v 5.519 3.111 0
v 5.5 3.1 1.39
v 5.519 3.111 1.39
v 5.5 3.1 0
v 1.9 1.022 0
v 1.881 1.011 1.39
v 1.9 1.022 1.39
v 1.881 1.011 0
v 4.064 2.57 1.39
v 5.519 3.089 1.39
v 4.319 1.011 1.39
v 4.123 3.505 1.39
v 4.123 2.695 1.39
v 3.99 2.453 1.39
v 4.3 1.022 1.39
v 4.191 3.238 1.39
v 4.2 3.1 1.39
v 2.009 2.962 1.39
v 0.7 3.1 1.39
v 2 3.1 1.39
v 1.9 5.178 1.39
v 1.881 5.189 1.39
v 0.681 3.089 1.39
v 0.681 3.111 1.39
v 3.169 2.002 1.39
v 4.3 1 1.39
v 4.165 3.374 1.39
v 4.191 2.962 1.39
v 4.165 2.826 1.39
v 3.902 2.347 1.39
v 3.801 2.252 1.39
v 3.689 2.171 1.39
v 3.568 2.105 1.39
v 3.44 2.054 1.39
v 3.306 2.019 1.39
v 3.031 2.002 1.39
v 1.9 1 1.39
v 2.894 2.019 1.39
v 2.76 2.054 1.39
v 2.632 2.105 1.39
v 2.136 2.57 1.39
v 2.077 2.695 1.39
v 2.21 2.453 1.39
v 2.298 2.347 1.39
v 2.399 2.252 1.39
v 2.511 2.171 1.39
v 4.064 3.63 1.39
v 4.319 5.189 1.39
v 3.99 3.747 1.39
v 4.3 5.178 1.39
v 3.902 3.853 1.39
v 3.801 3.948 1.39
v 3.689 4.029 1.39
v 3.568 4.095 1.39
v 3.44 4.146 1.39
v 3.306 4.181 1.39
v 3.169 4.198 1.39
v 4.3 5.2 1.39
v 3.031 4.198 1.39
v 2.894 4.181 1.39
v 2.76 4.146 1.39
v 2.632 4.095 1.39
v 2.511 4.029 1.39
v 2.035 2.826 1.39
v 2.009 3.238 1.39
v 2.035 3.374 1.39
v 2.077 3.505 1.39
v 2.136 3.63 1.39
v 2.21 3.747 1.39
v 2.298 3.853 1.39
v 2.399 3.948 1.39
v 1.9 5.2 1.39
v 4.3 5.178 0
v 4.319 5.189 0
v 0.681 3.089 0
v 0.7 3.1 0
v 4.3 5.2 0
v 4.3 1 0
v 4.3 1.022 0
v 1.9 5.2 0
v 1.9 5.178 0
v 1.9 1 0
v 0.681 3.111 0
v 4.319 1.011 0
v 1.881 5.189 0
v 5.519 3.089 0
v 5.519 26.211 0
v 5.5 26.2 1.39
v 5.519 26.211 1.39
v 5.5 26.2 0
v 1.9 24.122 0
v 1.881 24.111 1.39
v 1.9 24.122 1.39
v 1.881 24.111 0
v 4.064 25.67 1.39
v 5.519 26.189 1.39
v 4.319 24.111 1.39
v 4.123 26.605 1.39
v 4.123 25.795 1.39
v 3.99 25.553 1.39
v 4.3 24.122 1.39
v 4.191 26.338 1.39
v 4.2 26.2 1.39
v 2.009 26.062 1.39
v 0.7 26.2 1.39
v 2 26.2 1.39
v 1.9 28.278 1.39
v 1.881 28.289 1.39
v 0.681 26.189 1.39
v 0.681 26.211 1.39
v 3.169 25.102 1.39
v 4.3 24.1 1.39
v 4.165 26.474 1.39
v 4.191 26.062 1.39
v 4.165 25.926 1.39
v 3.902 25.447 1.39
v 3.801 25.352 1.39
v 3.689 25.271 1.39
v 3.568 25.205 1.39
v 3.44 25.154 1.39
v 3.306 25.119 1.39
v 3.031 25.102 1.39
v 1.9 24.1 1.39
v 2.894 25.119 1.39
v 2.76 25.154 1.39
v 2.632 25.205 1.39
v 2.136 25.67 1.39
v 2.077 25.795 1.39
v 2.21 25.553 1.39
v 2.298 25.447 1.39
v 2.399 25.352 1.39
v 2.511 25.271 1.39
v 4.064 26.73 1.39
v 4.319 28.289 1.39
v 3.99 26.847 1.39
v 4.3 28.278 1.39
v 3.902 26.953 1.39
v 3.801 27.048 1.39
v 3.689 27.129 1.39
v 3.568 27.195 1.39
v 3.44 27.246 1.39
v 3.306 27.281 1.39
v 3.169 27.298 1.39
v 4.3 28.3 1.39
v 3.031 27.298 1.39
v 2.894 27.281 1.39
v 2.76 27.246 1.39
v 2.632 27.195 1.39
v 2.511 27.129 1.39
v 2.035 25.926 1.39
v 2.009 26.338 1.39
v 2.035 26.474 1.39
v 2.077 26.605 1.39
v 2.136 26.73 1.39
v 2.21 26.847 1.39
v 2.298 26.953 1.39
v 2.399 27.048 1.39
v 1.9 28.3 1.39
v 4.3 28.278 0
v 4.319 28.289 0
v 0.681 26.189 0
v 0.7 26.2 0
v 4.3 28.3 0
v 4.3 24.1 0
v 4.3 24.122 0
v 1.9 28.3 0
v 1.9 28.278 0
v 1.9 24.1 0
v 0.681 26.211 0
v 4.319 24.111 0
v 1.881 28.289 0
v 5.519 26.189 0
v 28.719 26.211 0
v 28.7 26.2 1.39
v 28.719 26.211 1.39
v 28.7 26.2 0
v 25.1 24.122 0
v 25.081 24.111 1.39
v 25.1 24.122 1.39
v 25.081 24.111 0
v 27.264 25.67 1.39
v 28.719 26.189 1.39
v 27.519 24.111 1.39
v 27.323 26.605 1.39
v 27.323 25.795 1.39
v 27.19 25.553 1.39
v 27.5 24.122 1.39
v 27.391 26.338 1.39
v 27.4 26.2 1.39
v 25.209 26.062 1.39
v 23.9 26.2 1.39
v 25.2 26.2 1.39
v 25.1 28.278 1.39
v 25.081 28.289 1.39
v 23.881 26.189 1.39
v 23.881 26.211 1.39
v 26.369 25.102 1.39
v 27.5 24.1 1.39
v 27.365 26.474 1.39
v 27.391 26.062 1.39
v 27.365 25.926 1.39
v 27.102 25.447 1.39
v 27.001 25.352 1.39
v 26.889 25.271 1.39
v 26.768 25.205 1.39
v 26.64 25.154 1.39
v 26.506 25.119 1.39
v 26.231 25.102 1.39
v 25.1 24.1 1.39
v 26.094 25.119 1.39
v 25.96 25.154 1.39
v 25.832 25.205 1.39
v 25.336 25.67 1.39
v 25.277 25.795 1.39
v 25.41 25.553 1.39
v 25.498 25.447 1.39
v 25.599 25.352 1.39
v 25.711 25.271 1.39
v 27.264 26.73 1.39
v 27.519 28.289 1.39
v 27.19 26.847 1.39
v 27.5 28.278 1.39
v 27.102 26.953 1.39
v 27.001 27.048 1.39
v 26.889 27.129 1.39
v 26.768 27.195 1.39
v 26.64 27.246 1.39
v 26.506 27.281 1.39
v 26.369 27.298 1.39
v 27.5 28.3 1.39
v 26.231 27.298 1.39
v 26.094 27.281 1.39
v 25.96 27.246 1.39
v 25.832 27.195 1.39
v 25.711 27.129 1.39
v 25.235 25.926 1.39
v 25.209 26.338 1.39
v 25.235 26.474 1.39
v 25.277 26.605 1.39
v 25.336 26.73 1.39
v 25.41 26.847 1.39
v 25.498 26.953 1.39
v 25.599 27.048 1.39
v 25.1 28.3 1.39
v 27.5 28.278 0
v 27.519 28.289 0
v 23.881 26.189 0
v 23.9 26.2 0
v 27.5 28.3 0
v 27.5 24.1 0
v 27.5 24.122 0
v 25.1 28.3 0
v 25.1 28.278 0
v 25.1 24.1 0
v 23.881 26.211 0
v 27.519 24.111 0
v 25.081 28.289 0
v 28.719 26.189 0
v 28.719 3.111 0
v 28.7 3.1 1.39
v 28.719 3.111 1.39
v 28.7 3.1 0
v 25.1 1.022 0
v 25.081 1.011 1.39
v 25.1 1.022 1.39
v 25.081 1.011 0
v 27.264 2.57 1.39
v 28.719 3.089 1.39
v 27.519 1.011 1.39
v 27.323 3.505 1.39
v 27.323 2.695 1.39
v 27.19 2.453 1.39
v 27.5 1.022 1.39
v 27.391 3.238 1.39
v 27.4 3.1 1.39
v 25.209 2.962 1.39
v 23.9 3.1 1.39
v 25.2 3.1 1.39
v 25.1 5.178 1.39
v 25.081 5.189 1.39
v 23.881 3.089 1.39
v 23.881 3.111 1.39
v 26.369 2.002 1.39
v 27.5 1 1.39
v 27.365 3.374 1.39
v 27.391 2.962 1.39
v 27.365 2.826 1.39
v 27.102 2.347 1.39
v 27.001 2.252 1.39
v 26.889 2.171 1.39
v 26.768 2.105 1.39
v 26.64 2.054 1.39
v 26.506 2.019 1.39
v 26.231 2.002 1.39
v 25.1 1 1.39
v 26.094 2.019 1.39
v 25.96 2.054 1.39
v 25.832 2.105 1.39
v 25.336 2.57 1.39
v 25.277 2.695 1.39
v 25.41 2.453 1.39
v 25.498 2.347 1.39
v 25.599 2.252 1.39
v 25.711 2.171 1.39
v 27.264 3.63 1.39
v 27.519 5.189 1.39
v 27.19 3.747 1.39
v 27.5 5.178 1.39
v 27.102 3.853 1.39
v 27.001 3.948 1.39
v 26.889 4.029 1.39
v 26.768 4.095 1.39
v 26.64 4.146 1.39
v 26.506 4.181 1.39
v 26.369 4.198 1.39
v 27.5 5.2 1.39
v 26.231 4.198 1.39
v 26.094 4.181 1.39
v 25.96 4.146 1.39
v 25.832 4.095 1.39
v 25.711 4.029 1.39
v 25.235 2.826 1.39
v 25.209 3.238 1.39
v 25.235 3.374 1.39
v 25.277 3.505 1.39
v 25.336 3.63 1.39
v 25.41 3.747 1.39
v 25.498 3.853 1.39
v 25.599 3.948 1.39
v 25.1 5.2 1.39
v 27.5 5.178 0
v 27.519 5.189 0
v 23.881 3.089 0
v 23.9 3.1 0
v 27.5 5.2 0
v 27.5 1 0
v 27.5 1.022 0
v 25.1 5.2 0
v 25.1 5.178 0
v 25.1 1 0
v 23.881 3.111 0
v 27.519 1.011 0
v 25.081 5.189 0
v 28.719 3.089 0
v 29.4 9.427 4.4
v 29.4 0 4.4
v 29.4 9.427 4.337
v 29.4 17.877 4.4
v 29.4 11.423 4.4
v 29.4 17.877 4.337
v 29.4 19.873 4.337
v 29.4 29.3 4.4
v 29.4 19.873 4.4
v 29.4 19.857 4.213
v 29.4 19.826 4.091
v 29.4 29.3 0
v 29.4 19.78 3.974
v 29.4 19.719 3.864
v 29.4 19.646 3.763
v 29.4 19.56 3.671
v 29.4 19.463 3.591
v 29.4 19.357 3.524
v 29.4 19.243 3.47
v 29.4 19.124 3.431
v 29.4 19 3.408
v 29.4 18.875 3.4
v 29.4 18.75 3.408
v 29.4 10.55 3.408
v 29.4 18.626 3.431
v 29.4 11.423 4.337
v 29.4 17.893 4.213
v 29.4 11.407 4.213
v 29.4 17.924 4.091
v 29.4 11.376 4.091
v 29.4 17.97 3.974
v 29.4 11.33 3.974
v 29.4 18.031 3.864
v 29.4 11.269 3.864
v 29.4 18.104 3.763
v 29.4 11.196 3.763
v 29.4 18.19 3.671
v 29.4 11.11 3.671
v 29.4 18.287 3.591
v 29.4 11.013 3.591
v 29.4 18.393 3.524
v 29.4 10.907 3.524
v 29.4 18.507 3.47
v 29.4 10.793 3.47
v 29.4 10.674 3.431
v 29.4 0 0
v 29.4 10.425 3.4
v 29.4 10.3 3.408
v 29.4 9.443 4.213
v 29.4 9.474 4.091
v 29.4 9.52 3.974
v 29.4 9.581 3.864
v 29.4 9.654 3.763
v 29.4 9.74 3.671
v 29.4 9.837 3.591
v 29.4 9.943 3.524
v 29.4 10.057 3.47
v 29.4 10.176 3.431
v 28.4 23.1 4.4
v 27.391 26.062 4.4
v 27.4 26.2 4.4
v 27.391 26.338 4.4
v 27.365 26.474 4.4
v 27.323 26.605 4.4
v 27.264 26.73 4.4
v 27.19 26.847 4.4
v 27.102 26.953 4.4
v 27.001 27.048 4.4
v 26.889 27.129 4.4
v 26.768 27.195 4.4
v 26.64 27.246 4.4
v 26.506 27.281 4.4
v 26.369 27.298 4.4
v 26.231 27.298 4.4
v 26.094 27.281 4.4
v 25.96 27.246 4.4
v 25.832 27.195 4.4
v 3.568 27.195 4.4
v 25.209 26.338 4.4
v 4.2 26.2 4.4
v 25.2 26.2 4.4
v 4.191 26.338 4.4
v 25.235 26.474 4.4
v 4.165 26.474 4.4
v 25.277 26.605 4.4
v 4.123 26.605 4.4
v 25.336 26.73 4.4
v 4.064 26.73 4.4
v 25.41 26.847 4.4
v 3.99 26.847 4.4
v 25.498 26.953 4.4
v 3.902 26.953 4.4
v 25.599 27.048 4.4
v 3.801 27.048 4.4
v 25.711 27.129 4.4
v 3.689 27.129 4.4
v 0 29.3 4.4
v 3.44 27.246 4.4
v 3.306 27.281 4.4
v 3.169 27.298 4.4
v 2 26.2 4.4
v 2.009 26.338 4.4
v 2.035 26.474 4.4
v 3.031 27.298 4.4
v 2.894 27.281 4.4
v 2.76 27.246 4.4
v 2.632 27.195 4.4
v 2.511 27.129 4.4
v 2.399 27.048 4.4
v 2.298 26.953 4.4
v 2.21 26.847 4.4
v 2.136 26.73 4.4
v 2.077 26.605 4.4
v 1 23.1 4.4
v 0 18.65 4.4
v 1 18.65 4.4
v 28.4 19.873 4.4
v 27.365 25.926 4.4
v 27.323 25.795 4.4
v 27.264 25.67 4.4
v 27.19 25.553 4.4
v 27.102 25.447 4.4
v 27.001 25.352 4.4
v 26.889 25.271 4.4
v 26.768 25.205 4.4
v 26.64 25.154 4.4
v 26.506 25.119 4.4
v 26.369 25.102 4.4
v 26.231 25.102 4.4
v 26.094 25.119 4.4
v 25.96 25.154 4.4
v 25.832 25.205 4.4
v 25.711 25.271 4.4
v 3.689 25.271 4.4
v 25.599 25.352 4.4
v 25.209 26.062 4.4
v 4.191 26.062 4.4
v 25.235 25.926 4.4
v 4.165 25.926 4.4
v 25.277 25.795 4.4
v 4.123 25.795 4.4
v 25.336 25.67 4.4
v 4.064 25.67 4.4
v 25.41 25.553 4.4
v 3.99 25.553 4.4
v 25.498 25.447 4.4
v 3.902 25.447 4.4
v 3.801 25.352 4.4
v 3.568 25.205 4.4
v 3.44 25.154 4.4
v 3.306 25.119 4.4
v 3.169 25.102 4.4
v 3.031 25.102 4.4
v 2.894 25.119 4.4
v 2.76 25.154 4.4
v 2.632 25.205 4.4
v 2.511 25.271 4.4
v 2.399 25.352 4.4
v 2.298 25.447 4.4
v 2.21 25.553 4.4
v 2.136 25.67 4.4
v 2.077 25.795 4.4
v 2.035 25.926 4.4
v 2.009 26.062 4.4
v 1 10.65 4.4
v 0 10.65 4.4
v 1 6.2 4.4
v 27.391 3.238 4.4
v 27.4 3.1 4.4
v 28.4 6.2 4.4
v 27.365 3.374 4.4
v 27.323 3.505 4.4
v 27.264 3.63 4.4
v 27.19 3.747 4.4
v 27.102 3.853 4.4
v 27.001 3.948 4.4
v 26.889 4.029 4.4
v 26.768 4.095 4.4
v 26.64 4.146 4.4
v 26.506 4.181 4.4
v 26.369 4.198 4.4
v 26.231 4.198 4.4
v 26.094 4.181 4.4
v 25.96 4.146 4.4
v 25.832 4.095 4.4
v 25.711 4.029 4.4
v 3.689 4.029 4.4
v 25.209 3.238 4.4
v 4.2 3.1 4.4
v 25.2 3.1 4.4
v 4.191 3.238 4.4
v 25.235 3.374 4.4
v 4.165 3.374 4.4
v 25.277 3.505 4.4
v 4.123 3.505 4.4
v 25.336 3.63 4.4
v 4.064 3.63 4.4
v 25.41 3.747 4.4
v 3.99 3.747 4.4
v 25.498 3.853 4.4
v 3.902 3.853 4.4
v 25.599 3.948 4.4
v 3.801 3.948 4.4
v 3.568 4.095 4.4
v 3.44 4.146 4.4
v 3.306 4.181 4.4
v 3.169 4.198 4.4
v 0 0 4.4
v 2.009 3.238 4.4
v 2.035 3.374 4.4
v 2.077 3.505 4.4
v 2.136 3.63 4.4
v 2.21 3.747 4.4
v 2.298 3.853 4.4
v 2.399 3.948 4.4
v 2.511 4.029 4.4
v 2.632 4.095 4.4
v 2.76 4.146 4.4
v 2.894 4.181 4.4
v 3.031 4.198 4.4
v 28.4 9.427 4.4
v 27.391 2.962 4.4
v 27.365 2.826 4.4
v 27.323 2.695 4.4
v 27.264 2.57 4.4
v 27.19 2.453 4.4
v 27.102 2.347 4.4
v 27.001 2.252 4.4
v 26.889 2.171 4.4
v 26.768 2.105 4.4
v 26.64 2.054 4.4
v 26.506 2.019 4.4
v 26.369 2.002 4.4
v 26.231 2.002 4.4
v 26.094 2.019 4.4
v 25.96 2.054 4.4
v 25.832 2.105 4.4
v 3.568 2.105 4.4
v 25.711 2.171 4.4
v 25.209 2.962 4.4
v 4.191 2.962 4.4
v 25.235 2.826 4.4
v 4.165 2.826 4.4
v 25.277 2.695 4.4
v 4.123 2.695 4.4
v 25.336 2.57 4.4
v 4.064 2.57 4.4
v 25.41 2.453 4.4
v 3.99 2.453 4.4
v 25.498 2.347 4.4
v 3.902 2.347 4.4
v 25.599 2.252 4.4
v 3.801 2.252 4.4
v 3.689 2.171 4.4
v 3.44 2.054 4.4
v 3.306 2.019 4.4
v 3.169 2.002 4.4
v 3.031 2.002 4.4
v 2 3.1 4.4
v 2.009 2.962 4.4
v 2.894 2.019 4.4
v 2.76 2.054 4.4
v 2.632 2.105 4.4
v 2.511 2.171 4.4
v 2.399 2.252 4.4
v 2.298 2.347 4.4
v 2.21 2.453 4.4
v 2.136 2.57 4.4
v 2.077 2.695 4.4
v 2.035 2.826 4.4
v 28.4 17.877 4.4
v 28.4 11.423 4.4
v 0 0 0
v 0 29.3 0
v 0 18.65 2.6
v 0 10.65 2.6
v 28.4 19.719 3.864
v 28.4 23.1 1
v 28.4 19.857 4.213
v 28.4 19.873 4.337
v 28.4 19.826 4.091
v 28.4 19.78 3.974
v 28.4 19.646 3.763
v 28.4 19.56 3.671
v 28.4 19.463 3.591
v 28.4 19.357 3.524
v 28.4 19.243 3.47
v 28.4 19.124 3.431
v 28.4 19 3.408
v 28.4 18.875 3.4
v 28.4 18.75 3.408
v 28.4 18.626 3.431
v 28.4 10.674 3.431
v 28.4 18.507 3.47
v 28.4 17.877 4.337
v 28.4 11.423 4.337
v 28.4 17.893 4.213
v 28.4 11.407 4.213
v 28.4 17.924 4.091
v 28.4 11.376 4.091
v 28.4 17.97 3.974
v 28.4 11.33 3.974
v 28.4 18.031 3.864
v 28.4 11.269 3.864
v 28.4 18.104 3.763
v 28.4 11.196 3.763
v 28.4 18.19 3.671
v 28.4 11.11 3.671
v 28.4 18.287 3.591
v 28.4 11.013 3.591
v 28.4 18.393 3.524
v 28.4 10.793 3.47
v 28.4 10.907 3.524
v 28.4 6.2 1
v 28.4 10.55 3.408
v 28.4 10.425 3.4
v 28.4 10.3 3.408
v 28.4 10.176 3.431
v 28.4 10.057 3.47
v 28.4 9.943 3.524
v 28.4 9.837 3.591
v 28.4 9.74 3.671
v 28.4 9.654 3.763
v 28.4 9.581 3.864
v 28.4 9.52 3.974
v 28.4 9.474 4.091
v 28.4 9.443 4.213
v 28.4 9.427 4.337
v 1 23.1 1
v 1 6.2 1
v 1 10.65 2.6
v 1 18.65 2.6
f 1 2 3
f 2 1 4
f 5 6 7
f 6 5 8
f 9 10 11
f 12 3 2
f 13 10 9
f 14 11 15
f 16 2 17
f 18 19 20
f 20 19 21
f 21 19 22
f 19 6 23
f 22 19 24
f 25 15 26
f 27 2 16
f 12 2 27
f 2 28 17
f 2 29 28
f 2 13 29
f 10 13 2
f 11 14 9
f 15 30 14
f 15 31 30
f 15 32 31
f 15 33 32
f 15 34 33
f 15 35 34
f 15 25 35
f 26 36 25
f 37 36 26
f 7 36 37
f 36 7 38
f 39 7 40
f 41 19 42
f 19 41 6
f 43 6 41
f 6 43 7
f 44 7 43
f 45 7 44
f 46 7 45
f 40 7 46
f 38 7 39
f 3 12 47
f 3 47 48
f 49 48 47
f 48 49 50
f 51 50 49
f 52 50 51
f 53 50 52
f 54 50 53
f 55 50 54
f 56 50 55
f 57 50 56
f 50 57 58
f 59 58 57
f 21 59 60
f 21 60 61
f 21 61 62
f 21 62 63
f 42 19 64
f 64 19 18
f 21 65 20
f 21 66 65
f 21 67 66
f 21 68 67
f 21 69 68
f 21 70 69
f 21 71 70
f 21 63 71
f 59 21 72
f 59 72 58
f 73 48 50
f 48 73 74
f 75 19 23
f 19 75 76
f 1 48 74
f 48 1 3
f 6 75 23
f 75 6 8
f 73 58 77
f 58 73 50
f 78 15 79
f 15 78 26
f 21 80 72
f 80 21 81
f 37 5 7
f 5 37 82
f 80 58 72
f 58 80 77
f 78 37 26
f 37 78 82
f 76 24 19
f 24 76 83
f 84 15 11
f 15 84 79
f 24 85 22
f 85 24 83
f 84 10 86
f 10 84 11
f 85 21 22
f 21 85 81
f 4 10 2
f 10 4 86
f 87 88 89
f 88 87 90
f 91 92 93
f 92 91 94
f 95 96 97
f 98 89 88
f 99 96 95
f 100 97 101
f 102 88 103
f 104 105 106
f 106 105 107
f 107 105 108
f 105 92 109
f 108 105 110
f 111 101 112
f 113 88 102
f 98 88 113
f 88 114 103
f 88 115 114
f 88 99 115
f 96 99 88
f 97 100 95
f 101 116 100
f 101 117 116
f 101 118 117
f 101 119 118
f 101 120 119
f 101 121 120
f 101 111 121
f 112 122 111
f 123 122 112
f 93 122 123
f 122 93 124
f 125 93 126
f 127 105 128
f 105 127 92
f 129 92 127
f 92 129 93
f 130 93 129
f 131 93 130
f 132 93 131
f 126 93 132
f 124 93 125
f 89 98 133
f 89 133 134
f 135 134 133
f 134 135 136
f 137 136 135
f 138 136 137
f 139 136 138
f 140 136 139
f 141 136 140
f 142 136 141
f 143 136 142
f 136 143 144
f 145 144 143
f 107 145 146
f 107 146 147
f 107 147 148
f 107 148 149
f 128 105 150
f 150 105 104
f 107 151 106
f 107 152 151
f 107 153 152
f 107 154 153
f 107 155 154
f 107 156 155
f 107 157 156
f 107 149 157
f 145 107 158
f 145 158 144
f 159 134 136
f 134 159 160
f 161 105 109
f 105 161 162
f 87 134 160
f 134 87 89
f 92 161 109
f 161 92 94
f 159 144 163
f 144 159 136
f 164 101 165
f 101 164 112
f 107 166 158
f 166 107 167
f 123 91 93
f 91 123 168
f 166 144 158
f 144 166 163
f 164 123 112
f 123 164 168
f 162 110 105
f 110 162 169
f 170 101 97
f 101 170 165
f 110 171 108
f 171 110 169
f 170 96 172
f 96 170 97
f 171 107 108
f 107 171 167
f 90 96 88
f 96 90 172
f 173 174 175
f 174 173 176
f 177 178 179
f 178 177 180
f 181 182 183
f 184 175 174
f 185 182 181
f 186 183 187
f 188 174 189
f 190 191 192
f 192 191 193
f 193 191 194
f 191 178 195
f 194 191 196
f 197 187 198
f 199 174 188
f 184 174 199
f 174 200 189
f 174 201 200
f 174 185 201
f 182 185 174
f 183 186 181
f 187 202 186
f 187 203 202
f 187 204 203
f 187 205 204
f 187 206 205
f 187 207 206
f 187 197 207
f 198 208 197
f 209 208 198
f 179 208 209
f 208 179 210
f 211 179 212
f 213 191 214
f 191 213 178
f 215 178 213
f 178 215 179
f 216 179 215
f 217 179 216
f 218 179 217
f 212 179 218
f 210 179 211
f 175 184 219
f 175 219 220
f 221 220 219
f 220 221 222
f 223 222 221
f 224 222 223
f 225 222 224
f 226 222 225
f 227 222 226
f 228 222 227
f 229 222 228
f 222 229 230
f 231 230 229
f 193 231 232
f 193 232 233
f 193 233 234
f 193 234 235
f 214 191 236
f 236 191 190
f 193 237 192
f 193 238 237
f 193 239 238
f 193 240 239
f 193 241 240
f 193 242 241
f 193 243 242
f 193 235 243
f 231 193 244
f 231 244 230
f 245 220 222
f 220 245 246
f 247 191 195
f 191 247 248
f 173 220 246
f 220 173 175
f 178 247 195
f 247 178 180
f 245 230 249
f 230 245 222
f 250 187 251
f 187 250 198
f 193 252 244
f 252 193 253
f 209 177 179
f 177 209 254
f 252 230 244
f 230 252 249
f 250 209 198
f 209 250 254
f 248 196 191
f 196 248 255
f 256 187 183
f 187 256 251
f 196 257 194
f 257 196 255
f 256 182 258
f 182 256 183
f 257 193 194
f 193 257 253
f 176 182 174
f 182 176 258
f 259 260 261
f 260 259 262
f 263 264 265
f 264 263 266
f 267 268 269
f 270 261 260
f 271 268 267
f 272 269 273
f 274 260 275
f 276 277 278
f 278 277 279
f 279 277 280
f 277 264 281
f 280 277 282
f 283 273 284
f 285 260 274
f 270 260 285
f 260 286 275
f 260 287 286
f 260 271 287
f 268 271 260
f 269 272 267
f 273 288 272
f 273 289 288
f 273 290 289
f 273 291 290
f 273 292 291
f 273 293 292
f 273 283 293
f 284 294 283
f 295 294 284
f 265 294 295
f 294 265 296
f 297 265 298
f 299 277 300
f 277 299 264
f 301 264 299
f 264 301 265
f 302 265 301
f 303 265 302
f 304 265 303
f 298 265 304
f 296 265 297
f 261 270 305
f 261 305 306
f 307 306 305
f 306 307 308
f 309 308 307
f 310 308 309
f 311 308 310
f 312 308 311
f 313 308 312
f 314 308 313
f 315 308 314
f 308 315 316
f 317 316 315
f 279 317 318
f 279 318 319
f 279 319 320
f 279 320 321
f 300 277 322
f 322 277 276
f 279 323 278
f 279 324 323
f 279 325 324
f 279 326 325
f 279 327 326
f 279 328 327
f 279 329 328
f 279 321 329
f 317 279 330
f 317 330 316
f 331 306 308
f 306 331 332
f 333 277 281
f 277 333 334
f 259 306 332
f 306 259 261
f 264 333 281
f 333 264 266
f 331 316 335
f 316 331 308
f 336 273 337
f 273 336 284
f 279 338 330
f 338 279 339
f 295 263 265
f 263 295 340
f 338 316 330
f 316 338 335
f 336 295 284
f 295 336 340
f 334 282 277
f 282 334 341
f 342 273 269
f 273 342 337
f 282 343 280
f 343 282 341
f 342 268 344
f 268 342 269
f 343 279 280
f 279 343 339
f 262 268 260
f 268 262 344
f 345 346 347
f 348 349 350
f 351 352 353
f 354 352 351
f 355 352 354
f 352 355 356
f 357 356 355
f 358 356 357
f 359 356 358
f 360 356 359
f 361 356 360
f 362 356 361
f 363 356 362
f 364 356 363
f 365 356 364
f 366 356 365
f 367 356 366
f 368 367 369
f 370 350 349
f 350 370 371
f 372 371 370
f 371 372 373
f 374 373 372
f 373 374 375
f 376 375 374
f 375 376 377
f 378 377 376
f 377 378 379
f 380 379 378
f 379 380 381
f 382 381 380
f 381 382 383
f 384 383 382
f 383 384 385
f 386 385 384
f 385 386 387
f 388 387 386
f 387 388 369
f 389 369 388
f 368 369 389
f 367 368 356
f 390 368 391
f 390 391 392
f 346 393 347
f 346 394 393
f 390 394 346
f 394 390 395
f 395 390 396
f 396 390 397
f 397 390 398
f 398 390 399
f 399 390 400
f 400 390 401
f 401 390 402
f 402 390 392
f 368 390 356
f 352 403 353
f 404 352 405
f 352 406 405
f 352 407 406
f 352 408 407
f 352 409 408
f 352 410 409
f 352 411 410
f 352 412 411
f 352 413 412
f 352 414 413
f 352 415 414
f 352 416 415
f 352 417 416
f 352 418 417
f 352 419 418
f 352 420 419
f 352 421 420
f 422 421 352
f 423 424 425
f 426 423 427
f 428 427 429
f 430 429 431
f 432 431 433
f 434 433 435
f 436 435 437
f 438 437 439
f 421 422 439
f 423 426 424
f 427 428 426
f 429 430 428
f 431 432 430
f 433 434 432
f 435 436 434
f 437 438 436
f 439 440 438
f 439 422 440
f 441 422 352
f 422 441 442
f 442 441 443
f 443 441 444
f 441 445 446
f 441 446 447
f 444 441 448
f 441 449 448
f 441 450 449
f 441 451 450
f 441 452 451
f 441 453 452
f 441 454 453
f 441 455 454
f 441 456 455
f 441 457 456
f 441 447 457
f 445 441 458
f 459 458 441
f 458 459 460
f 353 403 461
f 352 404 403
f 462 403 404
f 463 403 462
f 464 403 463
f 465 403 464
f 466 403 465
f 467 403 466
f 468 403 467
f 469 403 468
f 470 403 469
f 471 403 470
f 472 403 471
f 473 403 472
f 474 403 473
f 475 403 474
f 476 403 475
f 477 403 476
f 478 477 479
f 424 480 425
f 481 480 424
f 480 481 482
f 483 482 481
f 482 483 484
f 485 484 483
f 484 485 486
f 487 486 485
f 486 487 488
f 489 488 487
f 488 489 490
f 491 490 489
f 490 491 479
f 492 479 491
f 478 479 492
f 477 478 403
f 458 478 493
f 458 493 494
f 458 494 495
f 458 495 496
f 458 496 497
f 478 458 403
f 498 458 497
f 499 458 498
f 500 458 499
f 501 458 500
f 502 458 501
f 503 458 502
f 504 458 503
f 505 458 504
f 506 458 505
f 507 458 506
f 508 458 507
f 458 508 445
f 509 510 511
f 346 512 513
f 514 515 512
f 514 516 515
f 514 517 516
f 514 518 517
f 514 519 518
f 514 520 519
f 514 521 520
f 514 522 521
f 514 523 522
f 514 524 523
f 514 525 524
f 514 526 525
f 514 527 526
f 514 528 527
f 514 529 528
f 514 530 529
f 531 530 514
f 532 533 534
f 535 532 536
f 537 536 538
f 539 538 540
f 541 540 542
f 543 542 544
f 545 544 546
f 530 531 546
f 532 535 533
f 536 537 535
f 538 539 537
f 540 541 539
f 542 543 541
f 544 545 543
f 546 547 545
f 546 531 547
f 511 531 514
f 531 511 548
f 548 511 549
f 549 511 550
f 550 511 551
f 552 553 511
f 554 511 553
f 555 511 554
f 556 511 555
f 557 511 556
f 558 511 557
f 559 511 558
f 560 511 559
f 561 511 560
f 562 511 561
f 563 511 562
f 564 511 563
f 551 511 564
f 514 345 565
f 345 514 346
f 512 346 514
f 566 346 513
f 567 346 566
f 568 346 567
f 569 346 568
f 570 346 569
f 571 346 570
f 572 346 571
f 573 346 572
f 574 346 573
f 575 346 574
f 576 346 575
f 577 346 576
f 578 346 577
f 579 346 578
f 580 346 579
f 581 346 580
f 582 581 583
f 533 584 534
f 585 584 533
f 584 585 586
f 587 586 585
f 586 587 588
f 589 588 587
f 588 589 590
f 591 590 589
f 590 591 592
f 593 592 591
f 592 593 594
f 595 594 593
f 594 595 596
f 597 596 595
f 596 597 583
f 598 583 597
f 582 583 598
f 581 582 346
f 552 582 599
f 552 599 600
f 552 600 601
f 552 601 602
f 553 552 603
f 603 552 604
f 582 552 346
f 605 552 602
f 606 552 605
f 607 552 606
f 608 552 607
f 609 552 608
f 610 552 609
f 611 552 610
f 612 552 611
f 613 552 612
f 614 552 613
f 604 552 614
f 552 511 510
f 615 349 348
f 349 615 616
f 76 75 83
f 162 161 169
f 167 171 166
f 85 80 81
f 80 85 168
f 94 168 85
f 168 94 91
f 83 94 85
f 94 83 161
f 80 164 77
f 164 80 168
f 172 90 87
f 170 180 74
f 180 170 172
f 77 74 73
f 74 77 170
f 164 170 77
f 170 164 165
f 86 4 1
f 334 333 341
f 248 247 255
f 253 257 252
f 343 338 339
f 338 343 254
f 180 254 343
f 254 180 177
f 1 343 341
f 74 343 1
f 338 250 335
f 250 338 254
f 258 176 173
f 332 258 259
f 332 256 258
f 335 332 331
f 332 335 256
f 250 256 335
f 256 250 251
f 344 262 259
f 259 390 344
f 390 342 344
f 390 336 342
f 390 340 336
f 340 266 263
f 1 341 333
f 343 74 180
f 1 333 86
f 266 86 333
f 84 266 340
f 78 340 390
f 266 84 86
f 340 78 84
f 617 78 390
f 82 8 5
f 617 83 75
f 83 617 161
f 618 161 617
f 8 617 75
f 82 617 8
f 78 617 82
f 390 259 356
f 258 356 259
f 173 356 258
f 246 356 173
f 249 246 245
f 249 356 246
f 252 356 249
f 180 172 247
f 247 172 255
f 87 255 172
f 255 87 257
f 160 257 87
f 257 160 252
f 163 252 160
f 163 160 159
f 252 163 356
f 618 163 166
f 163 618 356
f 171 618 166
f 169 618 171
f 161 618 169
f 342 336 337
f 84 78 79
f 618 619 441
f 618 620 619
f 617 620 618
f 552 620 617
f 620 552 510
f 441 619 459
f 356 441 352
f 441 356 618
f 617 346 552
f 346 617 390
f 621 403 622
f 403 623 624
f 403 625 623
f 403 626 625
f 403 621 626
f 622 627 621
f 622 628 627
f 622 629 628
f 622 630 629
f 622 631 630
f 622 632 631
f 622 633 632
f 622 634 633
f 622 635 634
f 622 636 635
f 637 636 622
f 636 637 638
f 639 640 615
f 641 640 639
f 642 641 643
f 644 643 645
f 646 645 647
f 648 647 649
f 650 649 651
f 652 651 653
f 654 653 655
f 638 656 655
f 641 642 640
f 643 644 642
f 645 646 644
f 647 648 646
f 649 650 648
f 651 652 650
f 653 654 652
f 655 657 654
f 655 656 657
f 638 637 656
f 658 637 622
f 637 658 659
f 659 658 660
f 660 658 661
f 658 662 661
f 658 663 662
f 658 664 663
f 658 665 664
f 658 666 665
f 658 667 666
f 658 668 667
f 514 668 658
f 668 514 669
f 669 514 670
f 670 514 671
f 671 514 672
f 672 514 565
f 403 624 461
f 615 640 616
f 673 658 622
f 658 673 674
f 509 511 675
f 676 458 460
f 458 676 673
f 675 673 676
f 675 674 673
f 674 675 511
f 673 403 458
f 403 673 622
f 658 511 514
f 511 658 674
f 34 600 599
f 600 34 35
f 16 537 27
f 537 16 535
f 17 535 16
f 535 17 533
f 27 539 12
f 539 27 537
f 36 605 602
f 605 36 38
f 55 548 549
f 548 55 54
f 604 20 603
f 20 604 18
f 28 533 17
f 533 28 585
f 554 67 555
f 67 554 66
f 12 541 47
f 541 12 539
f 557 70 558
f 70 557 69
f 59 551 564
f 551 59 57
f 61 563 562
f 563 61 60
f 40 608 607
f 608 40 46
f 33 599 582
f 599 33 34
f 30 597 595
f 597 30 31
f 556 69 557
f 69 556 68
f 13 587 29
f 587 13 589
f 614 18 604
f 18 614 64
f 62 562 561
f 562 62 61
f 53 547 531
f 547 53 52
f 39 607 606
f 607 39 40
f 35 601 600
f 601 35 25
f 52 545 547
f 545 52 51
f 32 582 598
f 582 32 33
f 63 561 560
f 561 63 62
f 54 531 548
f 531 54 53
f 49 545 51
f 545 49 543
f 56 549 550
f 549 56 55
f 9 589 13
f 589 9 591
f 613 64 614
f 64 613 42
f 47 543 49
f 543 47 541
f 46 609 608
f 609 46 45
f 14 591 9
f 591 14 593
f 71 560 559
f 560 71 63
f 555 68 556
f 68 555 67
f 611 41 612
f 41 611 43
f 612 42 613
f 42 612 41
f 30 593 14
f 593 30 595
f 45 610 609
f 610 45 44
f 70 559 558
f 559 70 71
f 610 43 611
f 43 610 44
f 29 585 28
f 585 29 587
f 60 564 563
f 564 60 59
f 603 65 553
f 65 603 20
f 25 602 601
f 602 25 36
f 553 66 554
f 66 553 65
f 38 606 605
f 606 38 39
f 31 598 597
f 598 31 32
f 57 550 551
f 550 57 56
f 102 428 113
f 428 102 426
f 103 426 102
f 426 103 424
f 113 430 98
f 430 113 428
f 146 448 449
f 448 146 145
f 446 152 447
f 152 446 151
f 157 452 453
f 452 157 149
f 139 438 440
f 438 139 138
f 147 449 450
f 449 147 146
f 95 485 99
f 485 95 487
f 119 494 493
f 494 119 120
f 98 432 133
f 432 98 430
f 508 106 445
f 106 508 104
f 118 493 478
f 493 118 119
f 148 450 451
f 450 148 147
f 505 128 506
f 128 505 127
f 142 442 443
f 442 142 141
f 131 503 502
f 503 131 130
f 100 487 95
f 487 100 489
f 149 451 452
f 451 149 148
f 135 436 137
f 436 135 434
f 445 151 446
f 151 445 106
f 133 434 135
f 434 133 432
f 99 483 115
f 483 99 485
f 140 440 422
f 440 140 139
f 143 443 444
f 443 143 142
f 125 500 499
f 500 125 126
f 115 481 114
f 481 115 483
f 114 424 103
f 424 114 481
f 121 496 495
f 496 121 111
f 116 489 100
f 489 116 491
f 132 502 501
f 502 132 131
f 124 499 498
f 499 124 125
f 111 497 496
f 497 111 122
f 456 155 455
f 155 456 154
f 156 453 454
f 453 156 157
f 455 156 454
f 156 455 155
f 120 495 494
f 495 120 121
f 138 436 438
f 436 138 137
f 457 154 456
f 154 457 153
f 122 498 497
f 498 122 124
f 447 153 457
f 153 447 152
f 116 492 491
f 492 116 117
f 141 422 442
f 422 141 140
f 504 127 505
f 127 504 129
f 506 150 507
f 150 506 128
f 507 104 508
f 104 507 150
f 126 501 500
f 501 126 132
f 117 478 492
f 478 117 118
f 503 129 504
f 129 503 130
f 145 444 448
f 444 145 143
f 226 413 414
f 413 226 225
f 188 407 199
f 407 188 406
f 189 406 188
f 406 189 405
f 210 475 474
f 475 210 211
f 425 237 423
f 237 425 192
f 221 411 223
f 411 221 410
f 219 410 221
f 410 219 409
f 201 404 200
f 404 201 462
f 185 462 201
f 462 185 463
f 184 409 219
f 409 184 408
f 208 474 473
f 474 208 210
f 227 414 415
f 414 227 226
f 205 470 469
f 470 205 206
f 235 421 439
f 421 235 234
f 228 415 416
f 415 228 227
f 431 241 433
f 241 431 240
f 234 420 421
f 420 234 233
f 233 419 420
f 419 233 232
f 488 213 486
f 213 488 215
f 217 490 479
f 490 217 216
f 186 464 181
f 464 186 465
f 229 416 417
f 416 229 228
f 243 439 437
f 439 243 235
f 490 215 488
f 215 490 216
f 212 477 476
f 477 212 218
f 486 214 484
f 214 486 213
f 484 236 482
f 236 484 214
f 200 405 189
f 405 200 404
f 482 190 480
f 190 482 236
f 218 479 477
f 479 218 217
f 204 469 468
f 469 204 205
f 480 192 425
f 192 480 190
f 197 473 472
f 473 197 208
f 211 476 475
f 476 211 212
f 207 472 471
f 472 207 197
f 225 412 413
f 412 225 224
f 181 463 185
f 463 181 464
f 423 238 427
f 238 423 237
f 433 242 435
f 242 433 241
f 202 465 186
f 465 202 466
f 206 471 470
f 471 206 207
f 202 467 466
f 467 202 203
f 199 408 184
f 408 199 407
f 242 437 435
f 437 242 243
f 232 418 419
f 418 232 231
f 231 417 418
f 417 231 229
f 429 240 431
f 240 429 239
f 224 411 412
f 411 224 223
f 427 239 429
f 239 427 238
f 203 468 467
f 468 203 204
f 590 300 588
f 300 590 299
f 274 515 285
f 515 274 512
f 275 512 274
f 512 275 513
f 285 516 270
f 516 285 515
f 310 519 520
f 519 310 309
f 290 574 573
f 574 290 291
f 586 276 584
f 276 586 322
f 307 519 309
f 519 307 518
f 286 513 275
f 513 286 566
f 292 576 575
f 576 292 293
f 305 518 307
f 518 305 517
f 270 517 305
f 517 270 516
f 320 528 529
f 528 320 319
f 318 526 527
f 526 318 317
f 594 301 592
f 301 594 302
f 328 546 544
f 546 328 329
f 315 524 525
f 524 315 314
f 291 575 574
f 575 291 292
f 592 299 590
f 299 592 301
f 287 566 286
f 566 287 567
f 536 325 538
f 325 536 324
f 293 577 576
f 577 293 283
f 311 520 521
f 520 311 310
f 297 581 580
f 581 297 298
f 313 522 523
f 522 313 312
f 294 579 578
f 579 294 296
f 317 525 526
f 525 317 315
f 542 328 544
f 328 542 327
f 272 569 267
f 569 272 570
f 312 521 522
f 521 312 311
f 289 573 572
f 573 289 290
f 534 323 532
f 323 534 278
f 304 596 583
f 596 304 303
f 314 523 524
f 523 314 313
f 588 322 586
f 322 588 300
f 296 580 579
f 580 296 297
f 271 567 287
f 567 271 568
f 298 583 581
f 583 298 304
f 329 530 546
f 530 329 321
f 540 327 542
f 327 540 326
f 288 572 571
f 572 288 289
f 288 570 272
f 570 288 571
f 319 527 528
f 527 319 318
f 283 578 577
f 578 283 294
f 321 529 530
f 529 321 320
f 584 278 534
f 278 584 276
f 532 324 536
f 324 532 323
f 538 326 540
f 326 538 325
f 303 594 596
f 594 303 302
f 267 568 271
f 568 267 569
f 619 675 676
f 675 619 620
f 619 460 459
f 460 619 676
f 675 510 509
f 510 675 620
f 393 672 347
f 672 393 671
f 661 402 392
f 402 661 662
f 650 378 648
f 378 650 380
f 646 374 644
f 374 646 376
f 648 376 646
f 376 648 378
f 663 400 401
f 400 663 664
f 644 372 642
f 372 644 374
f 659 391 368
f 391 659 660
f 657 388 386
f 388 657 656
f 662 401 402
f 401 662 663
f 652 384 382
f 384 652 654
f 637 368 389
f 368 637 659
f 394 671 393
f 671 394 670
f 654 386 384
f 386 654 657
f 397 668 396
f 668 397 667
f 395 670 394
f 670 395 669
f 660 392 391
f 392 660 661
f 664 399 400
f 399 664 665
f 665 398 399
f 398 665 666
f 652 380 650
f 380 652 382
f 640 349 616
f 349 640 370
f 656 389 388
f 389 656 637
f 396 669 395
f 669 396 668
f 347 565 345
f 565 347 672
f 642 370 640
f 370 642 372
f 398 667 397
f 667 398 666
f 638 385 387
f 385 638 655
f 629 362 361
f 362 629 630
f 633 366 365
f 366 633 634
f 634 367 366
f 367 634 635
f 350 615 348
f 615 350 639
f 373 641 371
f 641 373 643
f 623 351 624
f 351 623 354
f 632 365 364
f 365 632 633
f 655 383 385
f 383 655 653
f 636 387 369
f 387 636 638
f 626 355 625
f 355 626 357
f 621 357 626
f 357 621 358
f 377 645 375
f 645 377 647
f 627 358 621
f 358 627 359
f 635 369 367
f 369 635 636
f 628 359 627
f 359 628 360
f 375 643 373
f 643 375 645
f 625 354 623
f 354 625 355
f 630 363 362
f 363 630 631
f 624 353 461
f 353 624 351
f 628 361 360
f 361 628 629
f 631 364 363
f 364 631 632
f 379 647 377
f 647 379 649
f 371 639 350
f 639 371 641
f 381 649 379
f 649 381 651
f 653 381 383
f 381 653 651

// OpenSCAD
// bolt radius
br = 1.1;

// battery width and depth and heig
chax = 27.4;
chay = 16.9;
chaz = 4;
chazl = 3.15;

// bolt in depth
bi = 1.4;

// thickness
t = 1;

// bolt hat radius
bh = 2.1;

// usb
usby = 8;
usbz = 2.7;

// pcb
pcbz = 1.6;

// led
led1x = 6.5;
led2x = 11.5;
ledy = 1.2;
ledr = 1;

// wire radius
wr = 1;

module hexagon(size, height) {
  boxWidth = size/1.75;
  for (r = [-60, 0, 60]) rotate([0,0,r]) cube([boxWidth, size, height], true);
}

difference() {
cube([chax+2*t, chay+4*t+4*bh, chaz/2+t+bi]);
translate([t, 2*t+2*bh, t])
cube([chax, chay, chaz]);

// bolts
translate([t+bh,t+bh,-1])
cylinder($fn=50,10,br,br);
translate([t+bh,3*t+3*bh+chay,-1])
cylinder($fn=50,10,br,br);
translate([t+chax-bh,3*t+3*bh+chay,-1])
cylinder($fn=50,10,br,br);
translate([t+chax-bh,t+bh,-1])
cylinder($fn=50,10,br,br);

// holes for hats

translate([t+bh,t+bh,bi/2-0.01])
hexagon(bh*2, bi);
translate([t+bh,3*t+3*bh+chay,bi/2-0.01])
hexagon(bh*2, bi);
translate([t+chax-bh,3*t+3*bh+chay,bi/2-0.01])
hexagon(bh*2, bi);
translate([t+chax-bh,t+bh,bi/2-0.01])
hexagon(bh*2, bi);

/*
translate([t+bh,t+bh,-1])
cylinder($fn=50,bi+1,bh,bh);
translate([t+bh,3*t+3*bh+chay,-1])
cylinder($fn=50,bi+1,bh,bh);
translate([t+chax-bh,3*t+3*bh+chay,-1])
cylinder($fn=50,bi+1,bh,bh);
translate([t+chax-bh,t+bh,-1])
cylinder($fn=50,bi+1,bh,bh);
*/

// usb hole
translate([-1,chay/2+2*t+2*bh-usby/2,t+pcbz])
cube([10, usby, usbz]);

// led holes
/*
translate([t+led1x,2*t+2*bh+ledy,-1])
cylinder($fn=50,t+2,ledr,ledr);
translate([t+led2x,2*t+2*bh+ledy,-1])
cylinder($fn=50,t+2,ledr,ledr);
*/

// wire holes
translate([t+chax-1,chay/4+2*t+2*bh,chaz/2+t+bi])
rotate([0,90,0])
cylinder($fn=50,t+2,wr,wr);
translate([t+chax-1,chay/4*3+2*t+2*bh,chaz/2+t+bi])
rotate([0,90,0])
cylinder($fn=50,t+2,wr,wr);
}
